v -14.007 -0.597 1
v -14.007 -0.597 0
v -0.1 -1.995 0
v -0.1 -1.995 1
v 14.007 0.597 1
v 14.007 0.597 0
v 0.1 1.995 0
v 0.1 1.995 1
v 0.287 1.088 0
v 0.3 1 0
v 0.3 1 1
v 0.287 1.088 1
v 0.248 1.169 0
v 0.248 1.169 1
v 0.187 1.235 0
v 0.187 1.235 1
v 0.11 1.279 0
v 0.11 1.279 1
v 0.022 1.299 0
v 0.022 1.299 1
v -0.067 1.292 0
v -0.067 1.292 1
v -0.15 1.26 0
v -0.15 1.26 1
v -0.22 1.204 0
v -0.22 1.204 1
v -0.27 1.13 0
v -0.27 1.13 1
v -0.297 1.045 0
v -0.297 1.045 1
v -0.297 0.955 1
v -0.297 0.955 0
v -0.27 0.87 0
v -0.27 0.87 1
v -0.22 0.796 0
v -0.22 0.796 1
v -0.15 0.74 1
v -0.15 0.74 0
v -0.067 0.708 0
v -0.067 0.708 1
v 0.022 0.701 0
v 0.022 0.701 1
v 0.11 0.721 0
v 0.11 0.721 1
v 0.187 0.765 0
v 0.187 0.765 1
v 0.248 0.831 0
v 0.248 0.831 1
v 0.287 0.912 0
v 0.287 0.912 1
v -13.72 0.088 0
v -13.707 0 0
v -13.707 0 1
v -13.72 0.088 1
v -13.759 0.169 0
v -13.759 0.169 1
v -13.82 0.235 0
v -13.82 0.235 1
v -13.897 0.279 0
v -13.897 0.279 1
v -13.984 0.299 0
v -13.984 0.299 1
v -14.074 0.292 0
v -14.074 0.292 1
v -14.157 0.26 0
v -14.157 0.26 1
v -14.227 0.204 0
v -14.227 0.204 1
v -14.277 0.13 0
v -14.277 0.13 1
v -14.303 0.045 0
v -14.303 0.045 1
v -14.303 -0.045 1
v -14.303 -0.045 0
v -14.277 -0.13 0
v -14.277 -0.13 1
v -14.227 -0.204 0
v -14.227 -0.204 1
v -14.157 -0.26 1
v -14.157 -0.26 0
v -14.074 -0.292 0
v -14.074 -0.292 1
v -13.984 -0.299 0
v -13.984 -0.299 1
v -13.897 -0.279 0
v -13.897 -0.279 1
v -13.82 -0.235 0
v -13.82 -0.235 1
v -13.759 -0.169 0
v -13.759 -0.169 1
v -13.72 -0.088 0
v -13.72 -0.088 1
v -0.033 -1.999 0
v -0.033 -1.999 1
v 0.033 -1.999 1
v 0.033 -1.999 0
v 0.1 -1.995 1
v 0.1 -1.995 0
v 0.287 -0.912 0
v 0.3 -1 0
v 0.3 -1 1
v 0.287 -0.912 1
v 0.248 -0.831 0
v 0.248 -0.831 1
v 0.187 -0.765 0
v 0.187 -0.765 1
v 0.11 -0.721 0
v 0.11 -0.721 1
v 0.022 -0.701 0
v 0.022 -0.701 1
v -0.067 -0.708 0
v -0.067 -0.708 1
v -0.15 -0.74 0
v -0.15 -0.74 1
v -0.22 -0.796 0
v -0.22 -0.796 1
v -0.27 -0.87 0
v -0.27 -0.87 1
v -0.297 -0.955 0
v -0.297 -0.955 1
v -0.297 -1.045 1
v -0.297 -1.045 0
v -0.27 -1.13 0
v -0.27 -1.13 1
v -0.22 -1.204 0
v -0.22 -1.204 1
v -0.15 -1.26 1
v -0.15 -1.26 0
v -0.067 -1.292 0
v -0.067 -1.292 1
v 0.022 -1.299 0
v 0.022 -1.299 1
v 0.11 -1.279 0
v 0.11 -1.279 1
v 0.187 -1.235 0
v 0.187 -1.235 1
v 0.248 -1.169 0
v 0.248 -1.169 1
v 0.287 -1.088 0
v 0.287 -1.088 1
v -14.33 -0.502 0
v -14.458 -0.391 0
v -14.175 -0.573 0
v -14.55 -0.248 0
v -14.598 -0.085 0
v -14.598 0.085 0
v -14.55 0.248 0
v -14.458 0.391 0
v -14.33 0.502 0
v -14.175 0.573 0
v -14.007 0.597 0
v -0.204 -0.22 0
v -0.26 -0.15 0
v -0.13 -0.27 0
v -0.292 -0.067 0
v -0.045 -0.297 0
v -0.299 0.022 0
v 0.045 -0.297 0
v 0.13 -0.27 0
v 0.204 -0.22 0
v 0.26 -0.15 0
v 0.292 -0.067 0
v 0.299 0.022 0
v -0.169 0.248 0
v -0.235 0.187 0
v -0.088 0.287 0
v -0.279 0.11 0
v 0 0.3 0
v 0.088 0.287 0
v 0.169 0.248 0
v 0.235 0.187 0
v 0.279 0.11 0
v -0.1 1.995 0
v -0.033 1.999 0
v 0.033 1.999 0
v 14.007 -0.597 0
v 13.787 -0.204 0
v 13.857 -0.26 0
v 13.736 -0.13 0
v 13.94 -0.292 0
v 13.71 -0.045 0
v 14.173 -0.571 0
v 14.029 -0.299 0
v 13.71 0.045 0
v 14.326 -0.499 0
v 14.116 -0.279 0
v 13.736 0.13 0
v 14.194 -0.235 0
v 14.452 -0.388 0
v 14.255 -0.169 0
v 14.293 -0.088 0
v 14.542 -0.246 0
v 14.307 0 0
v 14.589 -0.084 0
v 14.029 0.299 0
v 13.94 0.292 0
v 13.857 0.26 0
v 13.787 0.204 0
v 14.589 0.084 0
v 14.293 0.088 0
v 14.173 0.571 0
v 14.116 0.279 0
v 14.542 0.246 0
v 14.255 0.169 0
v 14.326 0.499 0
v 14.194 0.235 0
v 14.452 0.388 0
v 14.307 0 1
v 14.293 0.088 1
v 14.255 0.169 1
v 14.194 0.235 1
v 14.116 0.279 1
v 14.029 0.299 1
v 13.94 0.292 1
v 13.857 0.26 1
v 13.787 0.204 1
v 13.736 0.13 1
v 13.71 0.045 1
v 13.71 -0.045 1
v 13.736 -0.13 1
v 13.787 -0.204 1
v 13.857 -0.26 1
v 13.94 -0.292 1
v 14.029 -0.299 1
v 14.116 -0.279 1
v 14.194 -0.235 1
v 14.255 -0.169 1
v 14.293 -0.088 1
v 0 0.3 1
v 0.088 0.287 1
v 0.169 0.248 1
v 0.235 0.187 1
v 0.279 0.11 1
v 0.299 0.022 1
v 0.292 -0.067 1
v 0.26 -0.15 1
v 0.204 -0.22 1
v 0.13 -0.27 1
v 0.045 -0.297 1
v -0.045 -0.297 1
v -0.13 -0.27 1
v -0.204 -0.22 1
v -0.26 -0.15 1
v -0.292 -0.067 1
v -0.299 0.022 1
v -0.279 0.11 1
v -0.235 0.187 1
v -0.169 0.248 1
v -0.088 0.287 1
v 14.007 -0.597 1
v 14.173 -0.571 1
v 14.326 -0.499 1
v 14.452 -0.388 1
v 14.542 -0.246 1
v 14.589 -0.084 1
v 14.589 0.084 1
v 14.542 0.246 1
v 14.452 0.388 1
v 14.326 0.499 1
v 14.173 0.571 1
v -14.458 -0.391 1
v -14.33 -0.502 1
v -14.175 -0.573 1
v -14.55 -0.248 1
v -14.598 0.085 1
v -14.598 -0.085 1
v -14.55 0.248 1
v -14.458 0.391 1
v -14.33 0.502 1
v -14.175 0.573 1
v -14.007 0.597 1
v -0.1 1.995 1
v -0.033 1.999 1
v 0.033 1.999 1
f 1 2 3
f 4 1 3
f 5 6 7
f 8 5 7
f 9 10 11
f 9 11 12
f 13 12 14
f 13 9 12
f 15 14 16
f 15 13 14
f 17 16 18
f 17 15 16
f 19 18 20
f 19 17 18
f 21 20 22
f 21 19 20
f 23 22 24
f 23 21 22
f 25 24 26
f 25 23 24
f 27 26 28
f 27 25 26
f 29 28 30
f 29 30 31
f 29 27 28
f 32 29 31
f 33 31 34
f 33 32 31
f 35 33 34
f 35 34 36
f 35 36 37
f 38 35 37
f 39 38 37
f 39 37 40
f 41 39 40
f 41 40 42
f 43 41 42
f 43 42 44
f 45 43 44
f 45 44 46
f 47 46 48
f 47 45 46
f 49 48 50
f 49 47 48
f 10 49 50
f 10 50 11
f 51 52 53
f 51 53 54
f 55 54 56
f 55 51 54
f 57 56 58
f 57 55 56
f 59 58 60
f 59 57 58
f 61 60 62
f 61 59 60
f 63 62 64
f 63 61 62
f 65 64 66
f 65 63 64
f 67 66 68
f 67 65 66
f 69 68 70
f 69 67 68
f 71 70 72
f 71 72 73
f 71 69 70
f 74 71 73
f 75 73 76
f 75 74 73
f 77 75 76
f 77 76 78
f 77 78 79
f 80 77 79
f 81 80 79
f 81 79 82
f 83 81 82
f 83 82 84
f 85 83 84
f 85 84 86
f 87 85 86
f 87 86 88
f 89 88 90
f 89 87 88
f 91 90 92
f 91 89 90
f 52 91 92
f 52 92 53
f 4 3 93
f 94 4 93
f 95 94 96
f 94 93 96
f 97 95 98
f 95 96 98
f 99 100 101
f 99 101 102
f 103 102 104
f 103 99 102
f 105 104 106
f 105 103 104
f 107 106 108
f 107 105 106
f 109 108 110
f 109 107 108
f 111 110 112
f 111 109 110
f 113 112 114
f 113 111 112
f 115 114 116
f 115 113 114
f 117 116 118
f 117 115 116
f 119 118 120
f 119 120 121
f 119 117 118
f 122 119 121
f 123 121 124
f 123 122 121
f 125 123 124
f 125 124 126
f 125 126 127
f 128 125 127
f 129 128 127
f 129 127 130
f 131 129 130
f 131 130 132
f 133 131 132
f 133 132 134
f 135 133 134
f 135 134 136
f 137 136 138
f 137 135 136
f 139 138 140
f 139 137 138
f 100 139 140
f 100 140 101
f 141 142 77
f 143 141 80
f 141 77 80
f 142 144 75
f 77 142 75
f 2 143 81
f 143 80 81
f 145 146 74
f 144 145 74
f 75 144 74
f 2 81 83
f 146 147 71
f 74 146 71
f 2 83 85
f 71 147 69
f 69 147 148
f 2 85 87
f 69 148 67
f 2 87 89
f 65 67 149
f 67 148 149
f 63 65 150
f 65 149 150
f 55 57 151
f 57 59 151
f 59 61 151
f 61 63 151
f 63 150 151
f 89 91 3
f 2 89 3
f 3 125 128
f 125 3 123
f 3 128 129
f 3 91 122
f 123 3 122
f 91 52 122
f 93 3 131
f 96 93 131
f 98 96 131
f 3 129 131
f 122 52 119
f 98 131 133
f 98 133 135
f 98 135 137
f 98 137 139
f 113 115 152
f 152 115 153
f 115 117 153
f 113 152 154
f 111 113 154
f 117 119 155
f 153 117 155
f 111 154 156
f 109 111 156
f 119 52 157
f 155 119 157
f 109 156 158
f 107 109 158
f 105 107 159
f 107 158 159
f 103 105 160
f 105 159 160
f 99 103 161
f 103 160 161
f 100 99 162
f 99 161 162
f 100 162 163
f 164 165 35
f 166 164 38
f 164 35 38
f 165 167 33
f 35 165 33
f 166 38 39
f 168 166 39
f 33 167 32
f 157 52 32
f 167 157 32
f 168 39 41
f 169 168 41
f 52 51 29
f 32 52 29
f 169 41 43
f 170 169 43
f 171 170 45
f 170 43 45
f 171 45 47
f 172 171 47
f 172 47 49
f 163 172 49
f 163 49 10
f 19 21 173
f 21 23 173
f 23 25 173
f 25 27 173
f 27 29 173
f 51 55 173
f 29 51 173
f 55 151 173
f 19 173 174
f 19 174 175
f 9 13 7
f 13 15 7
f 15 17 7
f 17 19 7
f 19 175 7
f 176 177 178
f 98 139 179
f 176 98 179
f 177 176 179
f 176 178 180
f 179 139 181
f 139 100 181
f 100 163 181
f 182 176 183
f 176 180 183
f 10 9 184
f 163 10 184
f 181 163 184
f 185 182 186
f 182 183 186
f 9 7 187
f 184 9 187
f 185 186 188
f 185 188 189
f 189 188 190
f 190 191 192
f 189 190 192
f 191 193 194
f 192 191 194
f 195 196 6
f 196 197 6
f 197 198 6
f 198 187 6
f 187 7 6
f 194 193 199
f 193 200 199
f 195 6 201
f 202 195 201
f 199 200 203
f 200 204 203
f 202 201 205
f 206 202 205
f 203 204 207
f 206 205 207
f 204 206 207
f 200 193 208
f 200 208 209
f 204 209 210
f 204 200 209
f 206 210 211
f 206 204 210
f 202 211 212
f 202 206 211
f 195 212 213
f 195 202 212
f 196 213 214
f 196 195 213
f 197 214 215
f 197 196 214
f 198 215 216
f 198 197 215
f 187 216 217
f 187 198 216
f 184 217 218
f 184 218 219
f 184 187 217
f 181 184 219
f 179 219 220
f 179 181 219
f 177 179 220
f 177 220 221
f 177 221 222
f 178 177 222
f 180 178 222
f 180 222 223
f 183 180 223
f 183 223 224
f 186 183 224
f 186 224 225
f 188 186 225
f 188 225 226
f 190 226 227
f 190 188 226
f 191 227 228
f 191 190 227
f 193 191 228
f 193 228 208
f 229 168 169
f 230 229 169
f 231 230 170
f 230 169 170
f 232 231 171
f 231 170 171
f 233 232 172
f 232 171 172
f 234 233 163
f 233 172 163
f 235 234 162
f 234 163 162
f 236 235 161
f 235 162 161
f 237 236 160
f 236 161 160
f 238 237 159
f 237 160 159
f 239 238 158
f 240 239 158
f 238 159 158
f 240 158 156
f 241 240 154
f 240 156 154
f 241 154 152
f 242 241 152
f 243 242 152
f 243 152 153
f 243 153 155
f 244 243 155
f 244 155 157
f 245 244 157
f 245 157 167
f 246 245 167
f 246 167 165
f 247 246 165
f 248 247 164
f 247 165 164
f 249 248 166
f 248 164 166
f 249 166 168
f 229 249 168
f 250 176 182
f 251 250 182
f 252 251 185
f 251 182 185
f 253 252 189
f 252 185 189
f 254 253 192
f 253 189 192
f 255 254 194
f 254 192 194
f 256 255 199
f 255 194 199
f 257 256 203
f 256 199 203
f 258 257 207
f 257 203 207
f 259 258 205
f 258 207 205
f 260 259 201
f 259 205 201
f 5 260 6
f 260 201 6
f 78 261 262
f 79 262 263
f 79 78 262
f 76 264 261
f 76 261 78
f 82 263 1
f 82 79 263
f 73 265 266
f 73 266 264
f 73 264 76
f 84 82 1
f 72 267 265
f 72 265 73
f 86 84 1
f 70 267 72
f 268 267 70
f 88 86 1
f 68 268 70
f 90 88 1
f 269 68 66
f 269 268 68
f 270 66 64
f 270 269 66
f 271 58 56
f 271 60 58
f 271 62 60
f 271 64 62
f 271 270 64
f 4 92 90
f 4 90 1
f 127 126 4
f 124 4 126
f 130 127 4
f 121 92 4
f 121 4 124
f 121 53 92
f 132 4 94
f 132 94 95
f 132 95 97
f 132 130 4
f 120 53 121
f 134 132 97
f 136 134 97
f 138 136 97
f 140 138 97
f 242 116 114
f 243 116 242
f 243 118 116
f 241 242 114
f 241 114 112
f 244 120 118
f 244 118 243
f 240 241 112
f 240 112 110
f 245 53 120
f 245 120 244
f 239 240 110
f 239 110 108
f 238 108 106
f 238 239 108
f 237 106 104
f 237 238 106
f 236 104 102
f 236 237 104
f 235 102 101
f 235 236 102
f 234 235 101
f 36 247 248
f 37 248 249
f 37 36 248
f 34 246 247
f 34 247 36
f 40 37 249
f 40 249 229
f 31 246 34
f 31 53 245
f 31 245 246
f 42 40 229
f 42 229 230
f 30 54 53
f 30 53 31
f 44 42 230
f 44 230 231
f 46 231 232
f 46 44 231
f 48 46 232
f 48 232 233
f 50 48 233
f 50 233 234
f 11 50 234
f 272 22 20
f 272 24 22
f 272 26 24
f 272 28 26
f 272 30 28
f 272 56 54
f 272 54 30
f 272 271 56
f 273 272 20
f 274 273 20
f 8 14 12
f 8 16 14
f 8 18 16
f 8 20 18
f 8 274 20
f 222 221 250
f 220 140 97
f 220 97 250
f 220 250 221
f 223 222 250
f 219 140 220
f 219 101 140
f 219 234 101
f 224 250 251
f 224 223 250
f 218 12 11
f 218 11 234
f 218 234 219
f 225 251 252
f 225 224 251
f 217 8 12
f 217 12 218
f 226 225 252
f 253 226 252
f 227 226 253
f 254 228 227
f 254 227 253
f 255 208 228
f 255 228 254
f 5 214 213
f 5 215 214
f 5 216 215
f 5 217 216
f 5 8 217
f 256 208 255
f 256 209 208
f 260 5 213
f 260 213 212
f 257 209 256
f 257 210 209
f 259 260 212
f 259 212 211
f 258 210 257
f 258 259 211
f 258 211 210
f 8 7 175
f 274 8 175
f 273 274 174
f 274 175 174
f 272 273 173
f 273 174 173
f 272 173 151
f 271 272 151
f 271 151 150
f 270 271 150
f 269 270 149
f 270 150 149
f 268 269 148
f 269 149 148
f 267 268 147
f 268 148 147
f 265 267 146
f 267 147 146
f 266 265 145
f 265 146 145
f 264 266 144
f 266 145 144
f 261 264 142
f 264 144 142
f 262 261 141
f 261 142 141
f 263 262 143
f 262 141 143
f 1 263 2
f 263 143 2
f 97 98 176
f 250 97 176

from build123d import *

# Parameters (mm, degrees)
SKETCH_1_R      = 0.3
EXTRUDE_4_DEPTH = 1


with BuildPart() as part:
    # 草图1 → 凸台-拉伸4 (new body)
    with BuildSketch(Plane.XY):
        with BuildLine():
            Line((-0.100008903, 1.994986542), (-14.006783195, 0.597177449))
            ThreePointArc((-14.006783195, 0.597177449), (-14.603960644, 0), (-14.006783195, -0.597177449))
            Line((-14.006783195, -0.597177449), (-0.100008903, -1.994986542))
            ThreePointArc((-0.100008903, -1.994986542), (0, -2), (0.100008903, -1.994986542))
            Line((0.100008903, -1.994986542), (14.006783195, -0.597177449))
            ThreePointArc((14.006783195, -0.597177449), (14.595169998, 0), (14.006783195, 0.597177449))
            Line((14.006783195, 0.597177449), (0.100008903, 1.994986542))
            ThreePointArc((0.100008903, 1.994986542), (0, 2), (-0.100008903, 1.994986542))
        make_face()
        with Locations((0, -1)):
            Circle(SKETCH_1_R, mode=Mode.SUBTRACT)
        with Locations((-14.006783195, 0)):
            Circle(SKETCH_1_R, mode=Mode.SUBTRACT)
        with BuildLine():
            ThreePointArc((0, -0.3), (-0.3, 0), (0, 0.3))
            ThreePointArc((0, 0.3), (0.3, 0), (0, -0.3))
        make_face(mode=Mode.SUBTRACT)
        with Locations((0, 1)):
            Circle(SKETCH_1_R, mode=Mode.SUBTRACT)
        with Locations((14.006783195, 0)):
            Circle(SKETCH_1_R, mode=Mode.SUBTRACT)
    extrude(amount=EXTRUDE_4_DEPTH)


solid = part.part
